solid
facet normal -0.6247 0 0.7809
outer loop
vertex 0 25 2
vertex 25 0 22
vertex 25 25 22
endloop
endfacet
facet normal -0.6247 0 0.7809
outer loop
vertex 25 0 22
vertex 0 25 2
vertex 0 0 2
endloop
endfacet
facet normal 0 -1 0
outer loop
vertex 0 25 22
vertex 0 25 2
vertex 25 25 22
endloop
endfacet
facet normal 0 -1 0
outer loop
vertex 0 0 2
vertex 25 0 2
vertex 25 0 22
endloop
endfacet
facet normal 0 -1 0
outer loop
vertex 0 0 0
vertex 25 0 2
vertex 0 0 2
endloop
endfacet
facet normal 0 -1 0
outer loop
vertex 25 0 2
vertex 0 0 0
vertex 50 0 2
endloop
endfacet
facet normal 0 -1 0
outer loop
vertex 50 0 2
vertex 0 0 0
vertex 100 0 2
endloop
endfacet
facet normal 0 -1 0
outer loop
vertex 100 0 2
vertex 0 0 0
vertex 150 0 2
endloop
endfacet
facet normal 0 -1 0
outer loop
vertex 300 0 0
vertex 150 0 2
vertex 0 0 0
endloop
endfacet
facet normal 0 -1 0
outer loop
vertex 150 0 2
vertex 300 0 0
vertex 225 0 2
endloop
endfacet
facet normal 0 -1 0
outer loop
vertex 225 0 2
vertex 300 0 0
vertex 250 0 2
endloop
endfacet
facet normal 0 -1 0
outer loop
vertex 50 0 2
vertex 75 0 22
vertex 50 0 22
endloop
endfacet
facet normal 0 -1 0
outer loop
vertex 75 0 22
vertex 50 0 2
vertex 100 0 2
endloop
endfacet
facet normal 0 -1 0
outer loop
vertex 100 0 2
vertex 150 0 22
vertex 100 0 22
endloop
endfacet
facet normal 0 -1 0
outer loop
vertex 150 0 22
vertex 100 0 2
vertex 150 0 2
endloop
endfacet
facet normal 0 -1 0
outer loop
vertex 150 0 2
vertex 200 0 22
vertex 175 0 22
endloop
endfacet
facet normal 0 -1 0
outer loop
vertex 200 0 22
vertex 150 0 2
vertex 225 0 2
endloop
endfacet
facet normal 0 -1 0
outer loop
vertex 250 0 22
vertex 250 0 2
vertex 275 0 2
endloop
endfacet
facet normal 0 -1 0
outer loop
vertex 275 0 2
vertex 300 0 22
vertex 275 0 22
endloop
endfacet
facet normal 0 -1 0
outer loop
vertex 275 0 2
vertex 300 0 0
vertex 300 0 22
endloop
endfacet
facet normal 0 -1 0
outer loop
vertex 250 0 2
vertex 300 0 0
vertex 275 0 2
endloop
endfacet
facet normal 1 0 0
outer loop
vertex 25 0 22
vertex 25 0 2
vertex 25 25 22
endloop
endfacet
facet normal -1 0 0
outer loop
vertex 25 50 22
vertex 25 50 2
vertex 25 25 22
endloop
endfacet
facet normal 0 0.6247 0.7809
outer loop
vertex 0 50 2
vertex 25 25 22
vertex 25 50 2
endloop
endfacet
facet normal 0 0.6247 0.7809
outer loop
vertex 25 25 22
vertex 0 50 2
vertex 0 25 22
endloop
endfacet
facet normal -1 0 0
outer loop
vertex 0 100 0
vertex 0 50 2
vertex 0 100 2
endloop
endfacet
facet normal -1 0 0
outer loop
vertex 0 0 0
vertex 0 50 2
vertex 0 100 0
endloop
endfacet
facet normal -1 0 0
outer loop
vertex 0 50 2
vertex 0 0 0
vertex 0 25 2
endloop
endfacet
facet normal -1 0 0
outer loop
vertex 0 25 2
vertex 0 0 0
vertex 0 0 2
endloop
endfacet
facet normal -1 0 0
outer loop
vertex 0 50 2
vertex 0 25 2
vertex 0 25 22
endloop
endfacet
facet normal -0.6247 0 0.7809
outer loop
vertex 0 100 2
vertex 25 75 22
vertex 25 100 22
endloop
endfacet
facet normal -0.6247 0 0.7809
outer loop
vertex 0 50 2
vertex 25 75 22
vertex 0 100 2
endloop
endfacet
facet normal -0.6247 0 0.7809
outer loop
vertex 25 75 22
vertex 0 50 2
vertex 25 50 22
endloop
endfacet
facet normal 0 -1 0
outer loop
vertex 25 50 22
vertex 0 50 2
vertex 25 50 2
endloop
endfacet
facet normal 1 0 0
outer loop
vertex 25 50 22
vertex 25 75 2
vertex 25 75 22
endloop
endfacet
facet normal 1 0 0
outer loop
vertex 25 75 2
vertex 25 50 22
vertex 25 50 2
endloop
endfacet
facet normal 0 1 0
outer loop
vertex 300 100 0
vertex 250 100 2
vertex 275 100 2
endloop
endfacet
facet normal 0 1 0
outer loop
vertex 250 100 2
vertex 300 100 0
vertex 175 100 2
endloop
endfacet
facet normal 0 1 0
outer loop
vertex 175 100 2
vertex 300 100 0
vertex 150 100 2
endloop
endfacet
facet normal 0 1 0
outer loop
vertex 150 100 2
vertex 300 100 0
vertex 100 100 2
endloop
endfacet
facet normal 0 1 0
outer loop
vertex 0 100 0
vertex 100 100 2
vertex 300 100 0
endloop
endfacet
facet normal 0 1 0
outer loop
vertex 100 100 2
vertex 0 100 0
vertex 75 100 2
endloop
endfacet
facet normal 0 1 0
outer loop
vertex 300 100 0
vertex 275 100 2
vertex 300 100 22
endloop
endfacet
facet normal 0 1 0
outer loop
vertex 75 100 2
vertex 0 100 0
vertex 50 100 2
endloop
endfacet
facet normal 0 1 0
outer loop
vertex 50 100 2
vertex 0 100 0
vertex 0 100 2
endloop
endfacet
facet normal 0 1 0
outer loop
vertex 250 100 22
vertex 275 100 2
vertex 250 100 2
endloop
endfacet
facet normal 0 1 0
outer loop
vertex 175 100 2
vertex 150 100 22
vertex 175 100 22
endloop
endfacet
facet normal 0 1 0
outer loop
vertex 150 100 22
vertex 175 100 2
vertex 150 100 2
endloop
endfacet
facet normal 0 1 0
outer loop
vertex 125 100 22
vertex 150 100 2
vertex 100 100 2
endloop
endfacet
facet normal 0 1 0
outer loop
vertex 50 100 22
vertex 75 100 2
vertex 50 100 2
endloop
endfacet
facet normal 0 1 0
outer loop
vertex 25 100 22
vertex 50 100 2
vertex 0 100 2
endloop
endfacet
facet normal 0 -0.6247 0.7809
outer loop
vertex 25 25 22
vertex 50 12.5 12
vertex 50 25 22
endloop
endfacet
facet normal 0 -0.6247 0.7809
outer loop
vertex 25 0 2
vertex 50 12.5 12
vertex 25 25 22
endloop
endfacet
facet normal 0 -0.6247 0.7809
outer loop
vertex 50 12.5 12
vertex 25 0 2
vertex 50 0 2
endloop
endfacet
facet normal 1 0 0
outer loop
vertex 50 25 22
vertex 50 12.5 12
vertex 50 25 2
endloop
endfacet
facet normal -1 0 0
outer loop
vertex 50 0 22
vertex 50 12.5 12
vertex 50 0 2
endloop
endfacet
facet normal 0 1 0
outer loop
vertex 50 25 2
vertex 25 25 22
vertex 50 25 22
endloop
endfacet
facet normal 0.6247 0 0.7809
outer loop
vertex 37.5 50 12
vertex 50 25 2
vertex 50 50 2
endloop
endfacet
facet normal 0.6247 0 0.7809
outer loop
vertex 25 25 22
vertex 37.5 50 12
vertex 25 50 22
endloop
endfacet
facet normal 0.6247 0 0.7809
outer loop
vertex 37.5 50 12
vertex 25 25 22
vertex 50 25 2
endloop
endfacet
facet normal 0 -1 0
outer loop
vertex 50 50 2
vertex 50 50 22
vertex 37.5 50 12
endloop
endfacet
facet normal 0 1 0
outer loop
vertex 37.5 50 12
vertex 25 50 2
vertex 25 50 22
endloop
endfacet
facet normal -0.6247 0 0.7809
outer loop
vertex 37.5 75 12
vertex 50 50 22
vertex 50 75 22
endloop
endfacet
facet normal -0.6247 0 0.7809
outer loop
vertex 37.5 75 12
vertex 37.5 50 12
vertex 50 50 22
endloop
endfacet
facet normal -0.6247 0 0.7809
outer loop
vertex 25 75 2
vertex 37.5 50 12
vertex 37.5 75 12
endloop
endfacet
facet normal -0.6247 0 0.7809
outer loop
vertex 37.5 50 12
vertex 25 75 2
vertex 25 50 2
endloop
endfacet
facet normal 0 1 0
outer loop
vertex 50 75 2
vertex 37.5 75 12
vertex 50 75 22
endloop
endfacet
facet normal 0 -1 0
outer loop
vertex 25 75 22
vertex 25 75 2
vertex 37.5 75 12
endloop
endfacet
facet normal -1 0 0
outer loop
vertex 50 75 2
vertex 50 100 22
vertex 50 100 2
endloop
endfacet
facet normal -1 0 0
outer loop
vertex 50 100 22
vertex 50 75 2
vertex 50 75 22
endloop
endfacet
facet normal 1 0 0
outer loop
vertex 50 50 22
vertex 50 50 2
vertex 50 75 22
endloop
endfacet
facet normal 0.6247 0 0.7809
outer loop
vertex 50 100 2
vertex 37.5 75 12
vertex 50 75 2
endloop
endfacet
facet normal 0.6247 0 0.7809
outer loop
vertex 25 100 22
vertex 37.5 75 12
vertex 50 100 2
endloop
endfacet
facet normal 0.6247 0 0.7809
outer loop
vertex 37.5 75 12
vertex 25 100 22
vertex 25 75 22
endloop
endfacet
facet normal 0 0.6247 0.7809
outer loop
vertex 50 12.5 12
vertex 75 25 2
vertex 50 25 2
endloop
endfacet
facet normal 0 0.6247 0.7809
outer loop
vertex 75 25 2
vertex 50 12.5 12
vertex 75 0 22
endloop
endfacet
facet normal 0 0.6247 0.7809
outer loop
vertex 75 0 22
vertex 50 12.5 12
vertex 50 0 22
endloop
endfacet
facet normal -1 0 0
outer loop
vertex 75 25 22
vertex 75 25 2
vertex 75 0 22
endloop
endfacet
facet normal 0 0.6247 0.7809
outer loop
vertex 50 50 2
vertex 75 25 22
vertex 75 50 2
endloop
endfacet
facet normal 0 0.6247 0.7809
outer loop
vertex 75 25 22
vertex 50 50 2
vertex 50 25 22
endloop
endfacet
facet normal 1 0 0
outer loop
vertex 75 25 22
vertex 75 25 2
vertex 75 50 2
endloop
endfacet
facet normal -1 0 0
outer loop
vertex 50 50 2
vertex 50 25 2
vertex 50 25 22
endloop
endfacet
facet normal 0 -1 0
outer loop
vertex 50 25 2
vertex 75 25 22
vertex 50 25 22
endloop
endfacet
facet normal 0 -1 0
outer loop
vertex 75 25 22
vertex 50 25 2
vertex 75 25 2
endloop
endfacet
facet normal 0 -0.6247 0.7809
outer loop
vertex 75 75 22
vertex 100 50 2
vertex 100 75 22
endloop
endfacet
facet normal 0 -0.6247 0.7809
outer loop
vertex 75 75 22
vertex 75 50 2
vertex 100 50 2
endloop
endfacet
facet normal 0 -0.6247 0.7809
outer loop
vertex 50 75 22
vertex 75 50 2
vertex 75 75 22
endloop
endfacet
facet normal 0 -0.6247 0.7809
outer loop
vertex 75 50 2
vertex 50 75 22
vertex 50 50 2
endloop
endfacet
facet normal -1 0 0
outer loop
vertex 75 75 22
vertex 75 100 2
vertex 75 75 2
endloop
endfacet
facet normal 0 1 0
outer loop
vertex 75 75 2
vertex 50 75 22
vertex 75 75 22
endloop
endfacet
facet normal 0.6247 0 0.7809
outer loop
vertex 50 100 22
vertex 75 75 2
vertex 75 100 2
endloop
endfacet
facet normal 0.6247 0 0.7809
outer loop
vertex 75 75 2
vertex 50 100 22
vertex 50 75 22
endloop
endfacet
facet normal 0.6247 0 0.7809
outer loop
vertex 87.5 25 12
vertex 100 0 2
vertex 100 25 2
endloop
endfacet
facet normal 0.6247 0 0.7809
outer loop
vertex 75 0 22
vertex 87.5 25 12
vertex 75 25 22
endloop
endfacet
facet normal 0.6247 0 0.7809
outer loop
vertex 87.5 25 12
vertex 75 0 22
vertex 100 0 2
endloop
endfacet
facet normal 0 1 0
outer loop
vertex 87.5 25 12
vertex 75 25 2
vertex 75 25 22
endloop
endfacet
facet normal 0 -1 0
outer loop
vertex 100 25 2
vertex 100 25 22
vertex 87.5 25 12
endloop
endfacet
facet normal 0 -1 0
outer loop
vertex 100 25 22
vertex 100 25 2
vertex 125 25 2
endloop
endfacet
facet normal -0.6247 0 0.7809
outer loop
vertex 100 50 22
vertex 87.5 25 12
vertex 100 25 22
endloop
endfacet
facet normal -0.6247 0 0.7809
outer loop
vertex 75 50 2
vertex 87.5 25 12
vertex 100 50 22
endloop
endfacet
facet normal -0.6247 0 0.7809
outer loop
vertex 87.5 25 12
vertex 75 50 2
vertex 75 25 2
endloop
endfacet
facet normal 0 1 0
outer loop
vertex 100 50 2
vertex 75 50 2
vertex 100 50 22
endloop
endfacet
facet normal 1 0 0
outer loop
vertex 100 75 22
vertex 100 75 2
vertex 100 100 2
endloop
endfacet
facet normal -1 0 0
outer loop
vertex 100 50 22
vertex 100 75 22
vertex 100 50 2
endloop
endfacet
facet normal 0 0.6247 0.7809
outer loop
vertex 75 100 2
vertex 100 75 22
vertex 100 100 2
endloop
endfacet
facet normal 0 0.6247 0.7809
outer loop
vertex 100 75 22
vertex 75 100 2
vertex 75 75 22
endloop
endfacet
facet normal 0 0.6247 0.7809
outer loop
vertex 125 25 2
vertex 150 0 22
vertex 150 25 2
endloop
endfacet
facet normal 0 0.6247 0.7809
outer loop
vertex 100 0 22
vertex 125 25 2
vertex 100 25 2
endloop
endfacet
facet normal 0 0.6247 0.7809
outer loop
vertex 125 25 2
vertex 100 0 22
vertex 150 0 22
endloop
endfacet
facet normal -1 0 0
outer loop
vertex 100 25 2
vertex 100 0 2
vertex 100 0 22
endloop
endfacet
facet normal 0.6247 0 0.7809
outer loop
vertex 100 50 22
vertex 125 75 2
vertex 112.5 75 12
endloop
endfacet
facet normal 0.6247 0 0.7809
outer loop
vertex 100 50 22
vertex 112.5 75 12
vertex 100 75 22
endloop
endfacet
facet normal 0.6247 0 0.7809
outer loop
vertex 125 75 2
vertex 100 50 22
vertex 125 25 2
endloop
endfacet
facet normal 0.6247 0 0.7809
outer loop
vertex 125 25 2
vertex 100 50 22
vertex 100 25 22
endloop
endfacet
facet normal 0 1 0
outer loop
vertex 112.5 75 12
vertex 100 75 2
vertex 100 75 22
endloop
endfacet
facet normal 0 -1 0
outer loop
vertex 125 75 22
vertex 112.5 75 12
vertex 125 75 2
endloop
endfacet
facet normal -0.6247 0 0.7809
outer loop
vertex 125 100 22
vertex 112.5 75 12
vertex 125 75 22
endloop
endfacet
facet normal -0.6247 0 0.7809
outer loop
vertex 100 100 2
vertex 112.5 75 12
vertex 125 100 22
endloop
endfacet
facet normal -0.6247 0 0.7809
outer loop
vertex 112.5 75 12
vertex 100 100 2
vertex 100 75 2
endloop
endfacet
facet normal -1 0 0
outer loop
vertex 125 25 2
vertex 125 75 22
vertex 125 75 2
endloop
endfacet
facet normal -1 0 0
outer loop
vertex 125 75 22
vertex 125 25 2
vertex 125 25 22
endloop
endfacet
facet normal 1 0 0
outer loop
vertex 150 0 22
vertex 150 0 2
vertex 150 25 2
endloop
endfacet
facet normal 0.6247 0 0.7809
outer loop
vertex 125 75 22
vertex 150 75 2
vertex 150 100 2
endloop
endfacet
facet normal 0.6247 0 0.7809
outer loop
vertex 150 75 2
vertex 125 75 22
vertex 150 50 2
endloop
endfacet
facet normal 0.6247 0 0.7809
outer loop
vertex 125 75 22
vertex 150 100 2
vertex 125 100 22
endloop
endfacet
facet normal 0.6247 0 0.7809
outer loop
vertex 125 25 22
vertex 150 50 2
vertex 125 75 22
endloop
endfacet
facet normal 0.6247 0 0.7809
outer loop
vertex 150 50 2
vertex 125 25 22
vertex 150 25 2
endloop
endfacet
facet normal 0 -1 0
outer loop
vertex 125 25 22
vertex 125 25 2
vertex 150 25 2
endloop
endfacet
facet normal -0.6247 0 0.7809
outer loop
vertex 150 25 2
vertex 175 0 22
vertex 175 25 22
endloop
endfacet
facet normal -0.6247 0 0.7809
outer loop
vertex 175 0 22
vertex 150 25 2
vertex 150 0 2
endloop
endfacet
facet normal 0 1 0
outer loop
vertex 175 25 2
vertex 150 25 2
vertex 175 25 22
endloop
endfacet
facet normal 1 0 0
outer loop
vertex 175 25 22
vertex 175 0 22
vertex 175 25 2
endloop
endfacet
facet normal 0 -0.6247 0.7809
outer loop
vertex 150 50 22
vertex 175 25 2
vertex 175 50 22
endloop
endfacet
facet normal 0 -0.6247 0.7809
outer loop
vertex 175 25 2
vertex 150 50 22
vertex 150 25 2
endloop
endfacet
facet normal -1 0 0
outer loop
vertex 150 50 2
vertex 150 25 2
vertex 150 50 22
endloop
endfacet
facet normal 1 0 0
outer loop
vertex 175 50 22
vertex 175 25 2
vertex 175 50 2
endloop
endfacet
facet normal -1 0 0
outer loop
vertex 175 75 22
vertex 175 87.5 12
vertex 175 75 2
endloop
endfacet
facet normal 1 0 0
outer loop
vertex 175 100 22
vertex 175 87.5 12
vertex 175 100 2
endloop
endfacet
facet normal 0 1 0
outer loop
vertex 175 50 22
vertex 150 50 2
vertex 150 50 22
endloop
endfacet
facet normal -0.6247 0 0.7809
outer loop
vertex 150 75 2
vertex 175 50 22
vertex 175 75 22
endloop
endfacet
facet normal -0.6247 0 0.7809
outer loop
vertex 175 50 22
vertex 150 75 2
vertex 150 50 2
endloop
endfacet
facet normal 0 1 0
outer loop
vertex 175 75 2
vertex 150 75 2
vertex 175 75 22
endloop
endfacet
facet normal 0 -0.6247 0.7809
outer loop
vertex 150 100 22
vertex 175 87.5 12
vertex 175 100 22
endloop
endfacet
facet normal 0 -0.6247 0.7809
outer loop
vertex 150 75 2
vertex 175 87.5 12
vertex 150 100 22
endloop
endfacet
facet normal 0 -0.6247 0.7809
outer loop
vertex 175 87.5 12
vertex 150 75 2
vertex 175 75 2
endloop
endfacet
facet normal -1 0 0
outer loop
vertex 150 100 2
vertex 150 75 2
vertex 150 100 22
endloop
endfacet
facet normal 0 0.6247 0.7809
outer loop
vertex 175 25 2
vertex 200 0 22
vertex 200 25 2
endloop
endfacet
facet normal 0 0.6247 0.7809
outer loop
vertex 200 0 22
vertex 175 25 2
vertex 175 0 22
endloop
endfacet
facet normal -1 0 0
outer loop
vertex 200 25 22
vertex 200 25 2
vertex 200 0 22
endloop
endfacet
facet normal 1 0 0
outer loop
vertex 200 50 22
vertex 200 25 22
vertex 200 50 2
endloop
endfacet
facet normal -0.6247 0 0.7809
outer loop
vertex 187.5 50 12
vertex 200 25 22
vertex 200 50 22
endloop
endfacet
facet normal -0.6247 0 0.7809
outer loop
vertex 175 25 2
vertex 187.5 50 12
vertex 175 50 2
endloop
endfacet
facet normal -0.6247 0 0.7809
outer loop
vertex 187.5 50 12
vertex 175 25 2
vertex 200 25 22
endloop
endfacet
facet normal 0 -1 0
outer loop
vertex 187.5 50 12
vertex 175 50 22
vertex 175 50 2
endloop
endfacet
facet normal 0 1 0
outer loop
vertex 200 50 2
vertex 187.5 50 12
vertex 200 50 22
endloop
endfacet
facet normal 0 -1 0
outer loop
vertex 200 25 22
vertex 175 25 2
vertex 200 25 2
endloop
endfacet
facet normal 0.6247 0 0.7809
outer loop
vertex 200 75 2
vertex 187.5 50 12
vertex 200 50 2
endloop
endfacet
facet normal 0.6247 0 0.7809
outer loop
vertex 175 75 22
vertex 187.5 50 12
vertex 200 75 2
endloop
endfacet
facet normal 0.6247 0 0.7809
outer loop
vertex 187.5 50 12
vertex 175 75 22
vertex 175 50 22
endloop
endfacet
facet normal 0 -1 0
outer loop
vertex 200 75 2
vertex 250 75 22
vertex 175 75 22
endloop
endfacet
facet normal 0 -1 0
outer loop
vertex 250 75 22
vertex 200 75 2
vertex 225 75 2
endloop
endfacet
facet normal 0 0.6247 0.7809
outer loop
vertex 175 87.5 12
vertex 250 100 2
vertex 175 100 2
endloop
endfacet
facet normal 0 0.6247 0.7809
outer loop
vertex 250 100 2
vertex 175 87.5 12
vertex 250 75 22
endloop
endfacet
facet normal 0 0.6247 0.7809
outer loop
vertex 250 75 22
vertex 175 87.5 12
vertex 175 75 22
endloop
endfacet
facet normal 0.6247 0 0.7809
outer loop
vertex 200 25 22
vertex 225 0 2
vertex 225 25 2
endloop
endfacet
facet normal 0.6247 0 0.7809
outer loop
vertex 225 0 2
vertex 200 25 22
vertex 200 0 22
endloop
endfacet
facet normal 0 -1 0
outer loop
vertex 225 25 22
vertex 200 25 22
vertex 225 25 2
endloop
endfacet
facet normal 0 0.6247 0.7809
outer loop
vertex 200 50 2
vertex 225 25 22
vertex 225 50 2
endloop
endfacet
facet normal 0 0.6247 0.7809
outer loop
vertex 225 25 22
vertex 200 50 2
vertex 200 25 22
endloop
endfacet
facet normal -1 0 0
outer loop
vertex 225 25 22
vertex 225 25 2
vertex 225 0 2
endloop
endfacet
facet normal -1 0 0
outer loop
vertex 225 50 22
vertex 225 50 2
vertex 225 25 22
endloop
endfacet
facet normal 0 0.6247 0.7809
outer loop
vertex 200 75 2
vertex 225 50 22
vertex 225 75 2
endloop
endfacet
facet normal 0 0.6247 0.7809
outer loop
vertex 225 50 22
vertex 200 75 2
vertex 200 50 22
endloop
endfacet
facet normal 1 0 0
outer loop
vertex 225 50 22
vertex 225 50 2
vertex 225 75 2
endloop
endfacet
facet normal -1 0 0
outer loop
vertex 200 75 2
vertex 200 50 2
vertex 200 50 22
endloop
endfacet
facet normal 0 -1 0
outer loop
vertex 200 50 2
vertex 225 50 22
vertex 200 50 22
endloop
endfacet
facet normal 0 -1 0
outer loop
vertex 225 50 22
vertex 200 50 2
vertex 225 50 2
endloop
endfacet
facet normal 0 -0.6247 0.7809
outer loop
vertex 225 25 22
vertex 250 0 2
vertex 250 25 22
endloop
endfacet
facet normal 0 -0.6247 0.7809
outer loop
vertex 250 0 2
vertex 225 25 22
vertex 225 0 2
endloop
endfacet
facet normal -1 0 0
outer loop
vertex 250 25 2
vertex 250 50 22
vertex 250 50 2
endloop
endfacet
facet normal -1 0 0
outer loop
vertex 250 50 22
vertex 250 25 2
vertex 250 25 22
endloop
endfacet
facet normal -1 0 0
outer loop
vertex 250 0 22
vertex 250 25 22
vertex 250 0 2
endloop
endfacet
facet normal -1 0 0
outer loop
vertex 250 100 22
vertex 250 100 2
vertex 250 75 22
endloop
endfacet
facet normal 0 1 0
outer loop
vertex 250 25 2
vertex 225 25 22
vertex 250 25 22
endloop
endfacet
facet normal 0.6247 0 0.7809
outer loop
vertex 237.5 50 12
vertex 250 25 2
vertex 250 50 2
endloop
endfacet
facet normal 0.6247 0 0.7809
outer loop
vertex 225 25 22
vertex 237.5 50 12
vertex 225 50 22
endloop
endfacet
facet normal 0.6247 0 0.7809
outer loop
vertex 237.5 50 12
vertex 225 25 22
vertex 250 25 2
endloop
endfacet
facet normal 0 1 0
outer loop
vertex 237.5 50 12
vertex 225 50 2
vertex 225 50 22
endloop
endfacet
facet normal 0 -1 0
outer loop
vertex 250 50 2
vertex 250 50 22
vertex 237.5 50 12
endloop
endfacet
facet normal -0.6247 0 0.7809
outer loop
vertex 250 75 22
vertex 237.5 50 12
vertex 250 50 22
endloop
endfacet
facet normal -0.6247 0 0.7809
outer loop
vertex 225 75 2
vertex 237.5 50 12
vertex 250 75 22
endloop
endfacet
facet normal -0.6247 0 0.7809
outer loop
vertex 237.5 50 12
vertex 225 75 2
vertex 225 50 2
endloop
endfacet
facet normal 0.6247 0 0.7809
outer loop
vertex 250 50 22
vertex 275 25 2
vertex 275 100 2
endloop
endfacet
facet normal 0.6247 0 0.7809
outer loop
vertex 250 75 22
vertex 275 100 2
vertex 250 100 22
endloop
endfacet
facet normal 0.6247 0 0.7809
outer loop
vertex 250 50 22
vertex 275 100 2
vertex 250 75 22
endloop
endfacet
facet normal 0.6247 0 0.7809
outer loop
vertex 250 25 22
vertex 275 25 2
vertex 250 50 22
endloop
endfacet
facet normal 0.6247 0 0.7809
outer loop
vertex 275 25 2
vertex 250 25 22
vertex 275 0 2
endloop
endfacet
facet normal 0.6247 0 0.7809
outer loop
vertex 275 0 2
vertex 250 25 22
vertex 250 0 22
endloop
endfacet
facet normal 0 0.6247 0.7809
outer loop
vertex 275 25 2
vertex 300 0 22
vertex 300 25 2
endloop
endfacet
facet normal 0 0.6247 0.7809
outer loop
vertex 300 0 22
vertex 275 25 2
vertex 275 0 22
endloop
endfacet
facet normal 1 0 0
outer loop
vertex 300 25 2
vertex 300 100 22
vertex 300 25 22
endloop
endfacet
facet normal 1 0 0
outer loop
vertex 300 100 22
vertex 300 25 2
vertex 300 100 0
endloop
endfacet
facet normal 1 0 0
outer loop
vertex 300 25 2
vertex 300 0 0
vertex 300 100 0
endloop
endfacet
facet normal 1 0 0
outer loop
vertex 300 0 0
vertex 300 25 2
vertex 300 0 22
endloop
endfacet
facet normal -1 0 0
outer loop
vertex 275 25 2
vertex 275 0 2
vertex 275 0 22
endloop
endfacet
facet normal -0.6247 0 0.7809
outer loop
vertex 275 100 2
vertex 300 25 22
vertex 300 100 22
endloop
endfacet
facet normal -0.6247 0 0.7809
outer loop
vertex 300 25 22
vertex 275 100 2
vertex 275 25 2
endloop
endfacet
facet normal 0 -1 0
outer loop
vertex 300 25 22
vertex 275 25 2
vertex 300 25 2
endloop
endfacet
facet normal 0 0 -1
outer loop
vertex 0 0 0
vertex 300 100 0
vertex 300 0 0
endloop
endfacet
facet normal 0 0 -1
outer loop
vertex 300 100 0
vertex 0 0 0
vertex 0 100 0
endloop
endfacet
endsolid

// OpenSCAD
// inspired by Mary Martin's work "Inversions"
// https://www.tate.org.uk/art/artists/mary-martin-1586
// https://en.wikipedia.org/wiki/Mary_Martin_(artist)
//
// by Laura Taalman and Edmund Harriss
// http://mathgrrl.com http://maxwelldemon.com
// Made at the #0things Hackathon at Construct3d 2018
//
// Inspired by British constructivist Artist Mary Martin
// https://www.tate.org.uk/art/artists/mary-martin-1586
// https://en.wikipedia.org/wiki/Mary_Martin_(artist)
// and her artwork Inversions
// https://www.tate.org.uk/art/artworks/martin-inversions-t01198
// Now in the Tate Gallery in London. We use random numbers here, but the original 
// work uses the mathematical idea of permutations. Can you work out the structure hidden
// in her beautiful work?

/////////////////////////////////////////////
// parameters

// random seed
random_seed = 1729; // [1:1:9999]
//random_seed = floor(rands(1,9999,1)[0]);  // use for openscad
//random_seed = 1;                          // use for fixed seed

// Width of the canvas (long side)
width = 100;

// Number of pieces across the long side
cols = 12;

// Number of pieces vertically
rows = 4;

// Height of the pieces (out from the canvas)
height = 20;

// computed
side = width/rows;
length = cols*side;
baseheight = 2*1;

// random turn for each cell of grid
turn = rands(0,3.999,rows*cols,random_seed);

/////////////////////////////////////////////
// render

color("lightgray")
grid(side,height);

/////////////////////////////////////////////
// modules
    
module grid(side,height){
    translate([0,0,baseheight])
    for(j=[0:cols-1])
        for(i=[0:rows-1]){
            translate([j*side,i*side,0])
            translate([side/2,side/2,0])
            rotate(floor(turn[j+i*(cols-1)])*90,[0,0,1])
            translate([-side/2,-side/2,0])
            tile(side,height);
        }
    base(length,width,baseheight);
}

module tile(side,height){
    polyhedron(
        points=[[0,0,0],[0,side,0],[side,side,0],[side,0,0],
                [0,0,height],[0,side,height]],
        faces=[[0,1,2,3],[3,2,5,4],[0,3,4],[2,1,5],[0,4,5,1]]
    );
}

module base(length,width,baseheight){
    cube([length,width,baseheight]);
}
